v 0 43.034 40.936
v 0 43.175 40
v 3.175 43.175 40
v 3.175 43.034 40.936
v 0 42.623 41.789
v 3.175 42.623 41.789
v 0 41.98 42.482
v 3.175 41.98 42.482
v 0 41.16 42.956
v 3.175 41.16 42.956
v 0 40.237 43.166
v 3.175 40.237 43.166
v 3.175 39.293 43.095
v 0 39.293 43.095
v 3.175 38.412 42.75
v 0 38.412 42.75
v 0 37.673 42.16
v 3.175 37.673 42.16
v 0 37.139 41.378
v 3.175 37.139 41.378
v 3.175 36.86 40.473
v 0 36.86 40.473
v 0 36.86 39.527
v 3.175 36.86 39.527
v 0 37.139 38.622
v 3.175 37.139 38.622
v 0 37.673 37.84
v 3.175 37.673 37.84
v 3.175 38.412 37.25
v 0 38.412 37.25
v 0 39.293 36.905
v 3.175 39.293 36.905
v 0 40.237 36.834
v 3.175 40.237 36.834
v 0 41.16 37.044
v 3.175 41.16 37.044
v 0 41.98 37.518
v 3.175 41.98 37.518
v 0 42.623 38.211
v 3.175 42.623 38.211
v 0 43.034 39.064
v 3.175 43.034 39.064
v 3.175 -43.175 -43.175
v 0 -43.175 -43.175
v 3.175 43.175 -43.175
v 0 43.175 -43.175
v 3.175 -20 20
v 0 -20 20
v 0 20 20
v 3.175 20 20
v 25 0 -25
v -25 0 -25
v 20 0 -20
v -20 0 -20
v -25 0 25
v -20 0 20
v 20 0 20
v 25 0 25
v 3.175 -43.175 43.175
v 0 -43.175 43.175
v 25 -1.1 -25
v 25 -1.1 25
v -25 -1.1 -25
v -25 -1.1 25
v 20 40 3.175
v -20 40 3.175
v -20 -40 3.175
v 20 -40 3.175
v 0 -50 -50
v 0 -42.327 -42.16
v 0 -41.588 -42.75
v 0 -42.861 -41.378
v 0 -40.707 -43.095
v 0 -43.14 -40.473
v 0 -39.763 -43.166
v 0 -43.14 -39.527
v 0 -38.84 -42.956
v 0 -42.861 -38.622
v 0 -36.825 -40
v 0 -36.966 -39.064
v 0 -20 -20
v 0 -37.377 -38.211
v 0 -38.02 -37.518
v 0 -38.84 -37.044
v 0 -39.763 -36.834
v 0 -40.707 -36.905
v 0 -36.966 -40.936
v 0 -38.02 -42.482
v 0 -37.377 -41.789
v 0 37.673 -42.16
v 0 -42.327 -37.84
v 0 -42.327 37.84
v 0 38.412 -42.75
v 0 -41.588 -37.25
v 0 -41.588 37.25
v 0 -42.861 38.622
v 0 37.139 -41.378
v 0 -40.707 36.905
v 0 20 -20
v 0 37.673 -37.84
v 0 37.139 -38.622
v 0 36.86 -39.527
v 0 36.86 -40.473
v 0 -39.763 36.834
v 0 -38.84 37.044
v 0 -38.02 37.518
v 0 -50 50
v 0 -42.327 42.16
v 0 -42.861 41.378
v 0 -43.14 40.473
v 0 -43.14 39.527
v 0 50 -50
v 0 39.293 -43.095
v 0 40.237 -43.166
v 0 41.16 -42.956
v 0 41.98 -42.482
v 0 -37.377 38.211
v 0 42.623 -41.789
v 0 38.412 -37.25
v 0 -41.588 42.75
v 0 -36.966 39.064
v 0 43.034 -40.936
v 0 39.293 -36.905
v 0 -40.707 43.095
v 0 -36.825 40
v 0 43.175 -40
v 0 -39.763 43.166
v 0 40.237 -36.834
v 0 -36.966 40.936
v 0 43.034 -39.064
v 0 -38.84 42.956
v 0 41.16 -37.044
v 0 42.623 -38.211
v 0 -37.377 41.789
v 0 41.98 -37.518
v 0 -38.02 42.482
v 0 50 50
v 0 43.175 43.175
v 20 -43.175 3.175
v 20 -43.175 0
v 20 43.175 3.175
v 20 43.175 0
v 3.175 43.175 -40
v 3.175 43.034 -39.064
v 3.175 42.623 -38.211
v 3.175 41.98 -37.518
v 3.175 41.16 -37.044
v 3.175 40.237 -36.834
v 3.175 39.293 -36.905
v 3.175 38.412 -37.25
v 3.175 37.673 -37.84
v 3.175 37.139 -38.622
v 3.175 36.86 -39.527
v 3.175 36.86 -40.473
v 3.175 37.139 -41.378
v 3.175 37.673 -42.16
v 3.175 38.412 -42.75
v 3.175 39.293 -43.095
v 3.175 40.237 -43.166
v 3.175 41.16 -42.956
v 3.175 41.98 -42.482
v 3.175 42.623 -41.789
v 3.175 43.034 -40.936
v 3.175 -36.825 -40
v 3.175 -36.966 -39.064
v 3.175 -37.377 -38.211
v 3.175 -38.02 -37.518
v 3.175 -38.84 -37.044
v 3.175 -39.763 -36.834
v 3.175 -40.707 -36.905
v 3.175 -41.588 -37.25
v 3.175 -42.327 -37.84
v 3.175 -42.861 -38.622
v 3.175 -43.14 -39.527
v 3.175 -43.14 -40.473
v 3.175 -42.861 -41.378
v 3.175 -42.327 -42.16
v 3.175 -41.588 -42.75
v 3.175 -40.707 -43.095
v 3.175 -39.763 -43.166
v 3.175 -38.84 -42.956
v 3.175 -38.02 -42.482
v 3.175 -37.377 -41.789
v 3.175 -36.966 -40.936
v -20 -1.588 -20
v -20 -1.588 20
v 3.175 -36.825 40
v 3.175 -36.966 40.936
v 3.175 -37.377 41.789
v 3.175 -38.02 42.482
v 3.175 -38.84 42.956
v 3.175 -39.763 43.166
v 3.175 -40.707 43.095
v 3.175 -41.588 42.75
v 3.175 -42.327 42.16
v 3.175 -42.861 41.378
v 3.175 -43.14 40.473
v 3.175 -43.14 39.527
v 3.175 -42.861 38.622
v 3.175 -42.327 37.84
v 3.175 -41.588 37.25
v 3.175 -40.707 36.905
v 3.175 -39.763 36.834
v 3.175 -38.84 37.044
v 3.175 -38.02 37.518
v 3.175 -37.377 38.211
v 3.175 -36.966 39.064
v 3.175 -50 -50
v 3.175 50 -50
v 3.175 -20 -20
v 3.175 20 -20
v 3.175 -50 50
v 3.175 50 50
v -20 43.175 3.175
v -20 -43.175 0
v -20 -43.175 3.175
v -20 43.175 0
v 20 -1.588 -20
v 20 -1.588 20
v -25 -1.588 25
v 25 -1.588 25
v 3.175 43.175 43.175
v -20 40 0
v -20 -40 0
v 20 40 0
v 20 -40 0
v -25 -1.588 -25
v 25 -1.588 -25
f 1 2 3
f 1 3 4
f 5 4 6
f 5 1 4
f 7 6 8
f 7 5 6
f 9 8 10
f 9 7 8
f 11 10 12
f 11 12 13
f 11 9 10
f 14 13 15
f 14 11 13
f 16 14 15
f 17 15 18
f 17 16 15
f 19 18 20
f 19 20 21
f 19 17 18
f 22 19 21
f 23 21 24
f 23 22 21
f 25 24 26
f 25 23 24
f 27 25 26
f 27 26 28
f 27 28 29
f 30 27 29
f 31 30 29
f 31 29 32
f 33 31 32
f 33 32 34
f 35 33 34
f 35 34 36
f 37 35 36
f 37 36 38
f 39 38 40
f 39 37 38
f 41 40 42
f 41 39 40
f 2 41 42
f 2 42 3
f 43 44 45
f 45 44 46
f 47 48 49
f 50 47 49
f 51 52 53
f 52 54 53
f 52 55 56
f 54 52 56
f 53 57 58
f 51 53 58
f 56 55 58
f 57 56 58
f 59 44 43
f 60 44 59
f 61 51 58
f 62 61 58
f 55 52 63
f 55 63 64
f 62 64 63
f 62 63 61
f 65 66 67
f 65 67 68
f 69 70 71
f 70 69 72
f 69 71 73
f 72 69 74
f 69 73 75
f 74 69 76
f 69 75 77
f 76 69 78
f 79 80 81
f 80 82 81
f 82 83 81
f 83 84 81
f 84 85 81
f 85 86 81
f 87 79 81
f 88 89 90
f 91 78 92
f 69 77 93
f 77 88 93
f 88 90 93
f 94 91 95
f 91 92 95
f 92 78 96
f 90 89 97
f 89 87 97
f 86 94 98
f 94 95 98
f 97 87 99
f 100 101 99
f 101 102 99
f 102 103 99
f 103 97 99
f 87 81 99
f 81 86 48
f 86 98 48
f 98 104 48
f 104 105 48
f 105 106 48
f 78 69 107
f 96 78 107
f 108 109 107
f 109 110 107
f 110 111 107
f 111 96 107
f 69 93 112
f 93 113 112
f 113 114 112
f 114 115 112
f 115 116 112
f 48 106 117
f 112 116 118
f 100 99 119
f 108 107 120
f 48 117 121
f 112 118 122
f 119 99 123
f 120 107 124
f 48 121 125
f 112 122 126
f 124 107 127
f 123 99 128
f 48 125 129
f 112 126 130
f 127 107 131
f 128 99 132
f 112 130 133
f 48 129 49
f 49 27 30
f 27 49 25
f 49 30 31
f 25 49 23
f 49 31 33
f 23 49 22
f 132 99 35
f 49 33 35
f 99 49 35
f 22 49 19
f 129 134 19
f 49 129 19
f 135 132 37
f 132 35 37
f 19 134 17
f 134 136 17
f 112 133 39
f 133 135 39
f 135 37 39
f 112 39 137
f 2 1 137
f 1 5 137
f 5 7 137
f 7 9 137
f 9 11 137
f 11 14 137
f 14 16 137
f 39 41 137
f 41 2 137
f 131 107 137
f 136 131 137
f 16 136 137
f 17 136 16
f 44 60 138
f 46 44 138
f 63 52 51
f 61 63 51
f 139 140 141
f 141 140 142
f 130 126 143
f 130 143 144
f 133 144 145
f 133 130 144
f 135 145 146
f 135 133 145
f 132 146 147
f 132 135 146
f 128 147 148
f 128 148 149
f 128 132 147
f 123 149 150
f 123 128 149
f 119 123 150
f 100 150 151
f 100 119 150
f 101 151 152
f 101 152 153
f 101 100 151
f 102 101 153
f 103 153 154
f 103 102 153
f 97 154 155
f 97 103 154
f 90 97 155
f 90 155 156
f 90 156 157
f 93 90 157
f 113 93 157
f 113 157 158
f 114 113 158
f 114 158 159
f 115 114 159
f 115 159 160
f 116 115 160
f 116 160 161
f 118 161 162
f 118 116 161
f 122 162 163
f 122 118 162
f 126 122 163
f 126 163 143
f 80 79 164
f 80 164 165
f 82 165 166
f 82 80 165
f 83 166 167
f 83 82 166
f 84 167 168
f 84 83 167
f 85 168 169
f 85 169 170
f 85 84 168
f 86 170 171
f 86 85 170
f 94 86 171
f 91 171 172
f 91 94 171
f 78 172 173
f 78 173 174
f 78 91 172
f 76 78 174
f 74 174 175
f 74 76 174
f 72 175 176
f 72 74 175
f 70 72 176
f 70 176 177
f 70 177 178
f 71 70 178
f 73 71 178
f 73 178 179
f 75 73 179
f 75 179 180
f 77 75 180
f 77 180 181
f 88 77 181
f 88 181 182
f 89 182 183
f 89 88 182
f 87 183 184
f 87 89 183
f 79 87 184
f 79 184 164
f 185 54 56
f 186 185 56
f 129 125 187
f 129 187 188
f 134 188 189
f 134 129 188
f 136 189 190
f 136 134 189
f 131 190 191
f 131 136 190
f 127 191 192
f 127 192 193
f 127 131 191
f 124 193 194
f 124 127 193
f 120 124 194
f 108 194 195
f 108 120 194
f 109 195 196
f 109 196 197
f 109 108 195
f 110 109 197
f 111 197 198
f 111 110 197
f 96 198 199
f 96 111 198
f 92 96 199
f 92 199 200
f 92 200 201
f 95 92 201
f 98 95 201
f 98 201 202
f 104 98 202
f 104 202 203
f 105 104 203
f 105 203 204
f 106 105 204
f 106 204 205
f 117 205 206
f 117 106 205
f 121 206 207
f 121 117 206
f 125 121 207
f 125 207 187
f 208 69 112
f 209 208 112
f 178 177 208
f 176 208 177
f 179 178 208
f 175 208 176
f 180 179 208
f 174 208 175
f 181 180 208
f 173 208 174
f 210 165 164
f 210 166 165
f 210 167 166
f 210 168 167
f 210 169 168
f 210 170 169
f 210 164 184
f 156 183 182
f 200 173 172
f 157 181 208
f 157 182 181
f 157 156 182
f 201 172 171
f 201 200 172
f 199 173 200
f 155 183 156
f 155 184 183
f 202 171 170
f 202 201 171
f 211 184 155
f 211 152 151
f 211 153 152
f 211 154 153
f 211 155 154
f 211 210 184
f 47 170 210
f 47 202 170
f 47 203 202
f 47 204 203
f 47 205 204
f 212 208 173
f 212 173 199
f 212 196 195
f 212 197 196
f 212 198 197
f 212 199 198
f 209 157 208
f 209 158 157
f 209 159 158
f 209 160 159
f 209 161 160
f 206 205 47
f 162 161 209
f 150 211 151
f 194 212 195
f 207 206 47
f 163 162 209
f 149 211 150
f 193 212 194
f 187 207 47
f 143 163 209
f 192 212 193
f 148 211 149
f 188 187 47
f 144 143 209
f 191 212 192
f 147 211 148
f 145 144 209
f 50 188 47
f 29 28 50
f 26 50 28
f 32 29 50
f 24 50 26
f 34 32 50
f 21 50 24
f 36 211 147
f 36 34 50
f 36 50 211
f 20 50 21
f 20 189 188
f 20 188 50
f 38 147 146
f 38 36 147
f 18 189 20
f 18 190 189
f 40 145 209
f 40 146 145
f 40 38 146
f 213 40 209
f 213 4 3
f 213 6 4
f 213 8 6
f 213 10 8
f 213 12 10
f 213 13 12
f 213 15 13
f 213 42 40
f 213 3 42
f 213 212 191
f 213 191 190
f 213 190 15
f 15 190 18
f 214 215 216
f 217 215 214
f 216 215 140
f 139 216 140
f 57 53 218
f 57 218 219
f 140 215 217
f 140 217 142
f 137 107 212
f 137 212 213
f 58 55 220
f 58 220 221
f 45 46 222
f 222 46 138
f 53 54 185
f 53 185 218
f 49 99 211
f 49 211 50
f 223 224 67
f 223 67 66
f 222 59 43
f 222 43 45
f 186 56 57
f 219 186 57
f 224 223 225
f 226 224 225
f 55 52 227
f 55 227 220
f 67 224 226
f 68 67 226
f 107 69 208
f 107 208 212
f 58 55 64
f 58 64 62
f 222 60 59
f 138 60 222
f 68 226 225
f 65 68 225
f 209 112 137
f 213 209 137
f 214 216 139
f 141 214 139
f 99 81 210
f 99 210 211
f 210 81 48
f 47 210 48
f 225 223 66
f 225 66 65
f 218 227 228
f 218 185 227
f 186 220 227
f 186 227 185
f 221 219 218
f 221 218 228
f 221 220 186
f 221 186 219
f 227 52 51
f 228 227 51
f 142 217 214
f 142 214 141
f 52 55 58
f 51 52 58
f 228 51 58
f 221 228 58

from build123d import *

# Parameters (mm, degrees)
F0_W      = 50
F0_H      = 50
F0_W_2    = 40
F0_H_2    = 40
F1_DEPTH  = 1.5875
F2_W      = 100
F2_H      = 100
F2_R      = 3.175
F2_W_2    = 40
F2_H_2    = 40
F3_DEPTH  = 3.175
F4_W      = 40
F4_H      = 80
F5_DEPTH  = 3.175
F6_W      = 50
F6_H      = 50
F7_DEPTH  = 1.1
F8_W      = 40
F8_H      = 86.35
F9_DEPTH  = 3.175
F10_W     = 86.35
F10_H     = 86.35
F11_DEPTH = 3.175


# Not quite as in the source:
# - a length typed as a fraction of an inch, garbled in the dataset ("3 / 203.2 mm" for 3/8 in), is restored


with BuildPart() as f1:
    # F0 (on Front) → F1 (new body)
    with BuildSketch(Plane.XZ):
        Rectangle(F0_W, F0_H)
        Rectangle(F0_W_2, F0_H_2, mode=Mode.SUBTRACT)
    extrude(amount=F1_DEPTH)


with BuildPart() as f3:
    # F2 (on Right) → F3 (new body)
    with BuildSketch(Plane.YZ):
        Rectangle(F2_W, F2_H)
        with Locations((-40, -40)):
            Circle(F2_R, mode=Mode.SUBTRACT)
        with Locations((40, -40)):
            Circle(F2_R, mode=Mode.SUBTRACT)
        with Locations((-40, 40)):
            Circle(F2_R, mode=Mode.SUBTRACT)
        Rectangle(F2_W_2, F2_H_2, mode=Mode.SUBTRACT)
        with Locations((40, 40)):
            Circle(F2_R, mode=Mode.SUBTRACT)
    extrude(amount=F3_DEPTH)


with BuildPart() as f5:
    # F4 (on Top) → F5 (new body)
    with BuildSketch(Plane.XY):
        Rectangle(F4_W, F4_H)
    extrude(amount=F5_DEPTH)


with BuildPart() as f7:
    # F6 (on Front) → F7 (new body)
    with BuildSketch(Plane.XZ):
        Rectangle(F6_W, F6_H)
    extrude(amount=F7_DEPTH)


with BuildPart() as f9:
    # F8 (on Top) → F9 (new body)
    with BuildSketch(Plane.XY):
        Rectangle(F8_W, F8_H)
    extrude(amount=F9_DEPTH)


with BuildPart() as f11:
    # F10 (on Right) → F11 (new body)
    with BuildSketch(Plane.YZ):
        Rectangle(F10_W, F10_H)
    extrude(amount=F11_DEPTH)


solid = Compound([f1.part, f3.part, f5.part, f7.part, f9.part, f11.part])
